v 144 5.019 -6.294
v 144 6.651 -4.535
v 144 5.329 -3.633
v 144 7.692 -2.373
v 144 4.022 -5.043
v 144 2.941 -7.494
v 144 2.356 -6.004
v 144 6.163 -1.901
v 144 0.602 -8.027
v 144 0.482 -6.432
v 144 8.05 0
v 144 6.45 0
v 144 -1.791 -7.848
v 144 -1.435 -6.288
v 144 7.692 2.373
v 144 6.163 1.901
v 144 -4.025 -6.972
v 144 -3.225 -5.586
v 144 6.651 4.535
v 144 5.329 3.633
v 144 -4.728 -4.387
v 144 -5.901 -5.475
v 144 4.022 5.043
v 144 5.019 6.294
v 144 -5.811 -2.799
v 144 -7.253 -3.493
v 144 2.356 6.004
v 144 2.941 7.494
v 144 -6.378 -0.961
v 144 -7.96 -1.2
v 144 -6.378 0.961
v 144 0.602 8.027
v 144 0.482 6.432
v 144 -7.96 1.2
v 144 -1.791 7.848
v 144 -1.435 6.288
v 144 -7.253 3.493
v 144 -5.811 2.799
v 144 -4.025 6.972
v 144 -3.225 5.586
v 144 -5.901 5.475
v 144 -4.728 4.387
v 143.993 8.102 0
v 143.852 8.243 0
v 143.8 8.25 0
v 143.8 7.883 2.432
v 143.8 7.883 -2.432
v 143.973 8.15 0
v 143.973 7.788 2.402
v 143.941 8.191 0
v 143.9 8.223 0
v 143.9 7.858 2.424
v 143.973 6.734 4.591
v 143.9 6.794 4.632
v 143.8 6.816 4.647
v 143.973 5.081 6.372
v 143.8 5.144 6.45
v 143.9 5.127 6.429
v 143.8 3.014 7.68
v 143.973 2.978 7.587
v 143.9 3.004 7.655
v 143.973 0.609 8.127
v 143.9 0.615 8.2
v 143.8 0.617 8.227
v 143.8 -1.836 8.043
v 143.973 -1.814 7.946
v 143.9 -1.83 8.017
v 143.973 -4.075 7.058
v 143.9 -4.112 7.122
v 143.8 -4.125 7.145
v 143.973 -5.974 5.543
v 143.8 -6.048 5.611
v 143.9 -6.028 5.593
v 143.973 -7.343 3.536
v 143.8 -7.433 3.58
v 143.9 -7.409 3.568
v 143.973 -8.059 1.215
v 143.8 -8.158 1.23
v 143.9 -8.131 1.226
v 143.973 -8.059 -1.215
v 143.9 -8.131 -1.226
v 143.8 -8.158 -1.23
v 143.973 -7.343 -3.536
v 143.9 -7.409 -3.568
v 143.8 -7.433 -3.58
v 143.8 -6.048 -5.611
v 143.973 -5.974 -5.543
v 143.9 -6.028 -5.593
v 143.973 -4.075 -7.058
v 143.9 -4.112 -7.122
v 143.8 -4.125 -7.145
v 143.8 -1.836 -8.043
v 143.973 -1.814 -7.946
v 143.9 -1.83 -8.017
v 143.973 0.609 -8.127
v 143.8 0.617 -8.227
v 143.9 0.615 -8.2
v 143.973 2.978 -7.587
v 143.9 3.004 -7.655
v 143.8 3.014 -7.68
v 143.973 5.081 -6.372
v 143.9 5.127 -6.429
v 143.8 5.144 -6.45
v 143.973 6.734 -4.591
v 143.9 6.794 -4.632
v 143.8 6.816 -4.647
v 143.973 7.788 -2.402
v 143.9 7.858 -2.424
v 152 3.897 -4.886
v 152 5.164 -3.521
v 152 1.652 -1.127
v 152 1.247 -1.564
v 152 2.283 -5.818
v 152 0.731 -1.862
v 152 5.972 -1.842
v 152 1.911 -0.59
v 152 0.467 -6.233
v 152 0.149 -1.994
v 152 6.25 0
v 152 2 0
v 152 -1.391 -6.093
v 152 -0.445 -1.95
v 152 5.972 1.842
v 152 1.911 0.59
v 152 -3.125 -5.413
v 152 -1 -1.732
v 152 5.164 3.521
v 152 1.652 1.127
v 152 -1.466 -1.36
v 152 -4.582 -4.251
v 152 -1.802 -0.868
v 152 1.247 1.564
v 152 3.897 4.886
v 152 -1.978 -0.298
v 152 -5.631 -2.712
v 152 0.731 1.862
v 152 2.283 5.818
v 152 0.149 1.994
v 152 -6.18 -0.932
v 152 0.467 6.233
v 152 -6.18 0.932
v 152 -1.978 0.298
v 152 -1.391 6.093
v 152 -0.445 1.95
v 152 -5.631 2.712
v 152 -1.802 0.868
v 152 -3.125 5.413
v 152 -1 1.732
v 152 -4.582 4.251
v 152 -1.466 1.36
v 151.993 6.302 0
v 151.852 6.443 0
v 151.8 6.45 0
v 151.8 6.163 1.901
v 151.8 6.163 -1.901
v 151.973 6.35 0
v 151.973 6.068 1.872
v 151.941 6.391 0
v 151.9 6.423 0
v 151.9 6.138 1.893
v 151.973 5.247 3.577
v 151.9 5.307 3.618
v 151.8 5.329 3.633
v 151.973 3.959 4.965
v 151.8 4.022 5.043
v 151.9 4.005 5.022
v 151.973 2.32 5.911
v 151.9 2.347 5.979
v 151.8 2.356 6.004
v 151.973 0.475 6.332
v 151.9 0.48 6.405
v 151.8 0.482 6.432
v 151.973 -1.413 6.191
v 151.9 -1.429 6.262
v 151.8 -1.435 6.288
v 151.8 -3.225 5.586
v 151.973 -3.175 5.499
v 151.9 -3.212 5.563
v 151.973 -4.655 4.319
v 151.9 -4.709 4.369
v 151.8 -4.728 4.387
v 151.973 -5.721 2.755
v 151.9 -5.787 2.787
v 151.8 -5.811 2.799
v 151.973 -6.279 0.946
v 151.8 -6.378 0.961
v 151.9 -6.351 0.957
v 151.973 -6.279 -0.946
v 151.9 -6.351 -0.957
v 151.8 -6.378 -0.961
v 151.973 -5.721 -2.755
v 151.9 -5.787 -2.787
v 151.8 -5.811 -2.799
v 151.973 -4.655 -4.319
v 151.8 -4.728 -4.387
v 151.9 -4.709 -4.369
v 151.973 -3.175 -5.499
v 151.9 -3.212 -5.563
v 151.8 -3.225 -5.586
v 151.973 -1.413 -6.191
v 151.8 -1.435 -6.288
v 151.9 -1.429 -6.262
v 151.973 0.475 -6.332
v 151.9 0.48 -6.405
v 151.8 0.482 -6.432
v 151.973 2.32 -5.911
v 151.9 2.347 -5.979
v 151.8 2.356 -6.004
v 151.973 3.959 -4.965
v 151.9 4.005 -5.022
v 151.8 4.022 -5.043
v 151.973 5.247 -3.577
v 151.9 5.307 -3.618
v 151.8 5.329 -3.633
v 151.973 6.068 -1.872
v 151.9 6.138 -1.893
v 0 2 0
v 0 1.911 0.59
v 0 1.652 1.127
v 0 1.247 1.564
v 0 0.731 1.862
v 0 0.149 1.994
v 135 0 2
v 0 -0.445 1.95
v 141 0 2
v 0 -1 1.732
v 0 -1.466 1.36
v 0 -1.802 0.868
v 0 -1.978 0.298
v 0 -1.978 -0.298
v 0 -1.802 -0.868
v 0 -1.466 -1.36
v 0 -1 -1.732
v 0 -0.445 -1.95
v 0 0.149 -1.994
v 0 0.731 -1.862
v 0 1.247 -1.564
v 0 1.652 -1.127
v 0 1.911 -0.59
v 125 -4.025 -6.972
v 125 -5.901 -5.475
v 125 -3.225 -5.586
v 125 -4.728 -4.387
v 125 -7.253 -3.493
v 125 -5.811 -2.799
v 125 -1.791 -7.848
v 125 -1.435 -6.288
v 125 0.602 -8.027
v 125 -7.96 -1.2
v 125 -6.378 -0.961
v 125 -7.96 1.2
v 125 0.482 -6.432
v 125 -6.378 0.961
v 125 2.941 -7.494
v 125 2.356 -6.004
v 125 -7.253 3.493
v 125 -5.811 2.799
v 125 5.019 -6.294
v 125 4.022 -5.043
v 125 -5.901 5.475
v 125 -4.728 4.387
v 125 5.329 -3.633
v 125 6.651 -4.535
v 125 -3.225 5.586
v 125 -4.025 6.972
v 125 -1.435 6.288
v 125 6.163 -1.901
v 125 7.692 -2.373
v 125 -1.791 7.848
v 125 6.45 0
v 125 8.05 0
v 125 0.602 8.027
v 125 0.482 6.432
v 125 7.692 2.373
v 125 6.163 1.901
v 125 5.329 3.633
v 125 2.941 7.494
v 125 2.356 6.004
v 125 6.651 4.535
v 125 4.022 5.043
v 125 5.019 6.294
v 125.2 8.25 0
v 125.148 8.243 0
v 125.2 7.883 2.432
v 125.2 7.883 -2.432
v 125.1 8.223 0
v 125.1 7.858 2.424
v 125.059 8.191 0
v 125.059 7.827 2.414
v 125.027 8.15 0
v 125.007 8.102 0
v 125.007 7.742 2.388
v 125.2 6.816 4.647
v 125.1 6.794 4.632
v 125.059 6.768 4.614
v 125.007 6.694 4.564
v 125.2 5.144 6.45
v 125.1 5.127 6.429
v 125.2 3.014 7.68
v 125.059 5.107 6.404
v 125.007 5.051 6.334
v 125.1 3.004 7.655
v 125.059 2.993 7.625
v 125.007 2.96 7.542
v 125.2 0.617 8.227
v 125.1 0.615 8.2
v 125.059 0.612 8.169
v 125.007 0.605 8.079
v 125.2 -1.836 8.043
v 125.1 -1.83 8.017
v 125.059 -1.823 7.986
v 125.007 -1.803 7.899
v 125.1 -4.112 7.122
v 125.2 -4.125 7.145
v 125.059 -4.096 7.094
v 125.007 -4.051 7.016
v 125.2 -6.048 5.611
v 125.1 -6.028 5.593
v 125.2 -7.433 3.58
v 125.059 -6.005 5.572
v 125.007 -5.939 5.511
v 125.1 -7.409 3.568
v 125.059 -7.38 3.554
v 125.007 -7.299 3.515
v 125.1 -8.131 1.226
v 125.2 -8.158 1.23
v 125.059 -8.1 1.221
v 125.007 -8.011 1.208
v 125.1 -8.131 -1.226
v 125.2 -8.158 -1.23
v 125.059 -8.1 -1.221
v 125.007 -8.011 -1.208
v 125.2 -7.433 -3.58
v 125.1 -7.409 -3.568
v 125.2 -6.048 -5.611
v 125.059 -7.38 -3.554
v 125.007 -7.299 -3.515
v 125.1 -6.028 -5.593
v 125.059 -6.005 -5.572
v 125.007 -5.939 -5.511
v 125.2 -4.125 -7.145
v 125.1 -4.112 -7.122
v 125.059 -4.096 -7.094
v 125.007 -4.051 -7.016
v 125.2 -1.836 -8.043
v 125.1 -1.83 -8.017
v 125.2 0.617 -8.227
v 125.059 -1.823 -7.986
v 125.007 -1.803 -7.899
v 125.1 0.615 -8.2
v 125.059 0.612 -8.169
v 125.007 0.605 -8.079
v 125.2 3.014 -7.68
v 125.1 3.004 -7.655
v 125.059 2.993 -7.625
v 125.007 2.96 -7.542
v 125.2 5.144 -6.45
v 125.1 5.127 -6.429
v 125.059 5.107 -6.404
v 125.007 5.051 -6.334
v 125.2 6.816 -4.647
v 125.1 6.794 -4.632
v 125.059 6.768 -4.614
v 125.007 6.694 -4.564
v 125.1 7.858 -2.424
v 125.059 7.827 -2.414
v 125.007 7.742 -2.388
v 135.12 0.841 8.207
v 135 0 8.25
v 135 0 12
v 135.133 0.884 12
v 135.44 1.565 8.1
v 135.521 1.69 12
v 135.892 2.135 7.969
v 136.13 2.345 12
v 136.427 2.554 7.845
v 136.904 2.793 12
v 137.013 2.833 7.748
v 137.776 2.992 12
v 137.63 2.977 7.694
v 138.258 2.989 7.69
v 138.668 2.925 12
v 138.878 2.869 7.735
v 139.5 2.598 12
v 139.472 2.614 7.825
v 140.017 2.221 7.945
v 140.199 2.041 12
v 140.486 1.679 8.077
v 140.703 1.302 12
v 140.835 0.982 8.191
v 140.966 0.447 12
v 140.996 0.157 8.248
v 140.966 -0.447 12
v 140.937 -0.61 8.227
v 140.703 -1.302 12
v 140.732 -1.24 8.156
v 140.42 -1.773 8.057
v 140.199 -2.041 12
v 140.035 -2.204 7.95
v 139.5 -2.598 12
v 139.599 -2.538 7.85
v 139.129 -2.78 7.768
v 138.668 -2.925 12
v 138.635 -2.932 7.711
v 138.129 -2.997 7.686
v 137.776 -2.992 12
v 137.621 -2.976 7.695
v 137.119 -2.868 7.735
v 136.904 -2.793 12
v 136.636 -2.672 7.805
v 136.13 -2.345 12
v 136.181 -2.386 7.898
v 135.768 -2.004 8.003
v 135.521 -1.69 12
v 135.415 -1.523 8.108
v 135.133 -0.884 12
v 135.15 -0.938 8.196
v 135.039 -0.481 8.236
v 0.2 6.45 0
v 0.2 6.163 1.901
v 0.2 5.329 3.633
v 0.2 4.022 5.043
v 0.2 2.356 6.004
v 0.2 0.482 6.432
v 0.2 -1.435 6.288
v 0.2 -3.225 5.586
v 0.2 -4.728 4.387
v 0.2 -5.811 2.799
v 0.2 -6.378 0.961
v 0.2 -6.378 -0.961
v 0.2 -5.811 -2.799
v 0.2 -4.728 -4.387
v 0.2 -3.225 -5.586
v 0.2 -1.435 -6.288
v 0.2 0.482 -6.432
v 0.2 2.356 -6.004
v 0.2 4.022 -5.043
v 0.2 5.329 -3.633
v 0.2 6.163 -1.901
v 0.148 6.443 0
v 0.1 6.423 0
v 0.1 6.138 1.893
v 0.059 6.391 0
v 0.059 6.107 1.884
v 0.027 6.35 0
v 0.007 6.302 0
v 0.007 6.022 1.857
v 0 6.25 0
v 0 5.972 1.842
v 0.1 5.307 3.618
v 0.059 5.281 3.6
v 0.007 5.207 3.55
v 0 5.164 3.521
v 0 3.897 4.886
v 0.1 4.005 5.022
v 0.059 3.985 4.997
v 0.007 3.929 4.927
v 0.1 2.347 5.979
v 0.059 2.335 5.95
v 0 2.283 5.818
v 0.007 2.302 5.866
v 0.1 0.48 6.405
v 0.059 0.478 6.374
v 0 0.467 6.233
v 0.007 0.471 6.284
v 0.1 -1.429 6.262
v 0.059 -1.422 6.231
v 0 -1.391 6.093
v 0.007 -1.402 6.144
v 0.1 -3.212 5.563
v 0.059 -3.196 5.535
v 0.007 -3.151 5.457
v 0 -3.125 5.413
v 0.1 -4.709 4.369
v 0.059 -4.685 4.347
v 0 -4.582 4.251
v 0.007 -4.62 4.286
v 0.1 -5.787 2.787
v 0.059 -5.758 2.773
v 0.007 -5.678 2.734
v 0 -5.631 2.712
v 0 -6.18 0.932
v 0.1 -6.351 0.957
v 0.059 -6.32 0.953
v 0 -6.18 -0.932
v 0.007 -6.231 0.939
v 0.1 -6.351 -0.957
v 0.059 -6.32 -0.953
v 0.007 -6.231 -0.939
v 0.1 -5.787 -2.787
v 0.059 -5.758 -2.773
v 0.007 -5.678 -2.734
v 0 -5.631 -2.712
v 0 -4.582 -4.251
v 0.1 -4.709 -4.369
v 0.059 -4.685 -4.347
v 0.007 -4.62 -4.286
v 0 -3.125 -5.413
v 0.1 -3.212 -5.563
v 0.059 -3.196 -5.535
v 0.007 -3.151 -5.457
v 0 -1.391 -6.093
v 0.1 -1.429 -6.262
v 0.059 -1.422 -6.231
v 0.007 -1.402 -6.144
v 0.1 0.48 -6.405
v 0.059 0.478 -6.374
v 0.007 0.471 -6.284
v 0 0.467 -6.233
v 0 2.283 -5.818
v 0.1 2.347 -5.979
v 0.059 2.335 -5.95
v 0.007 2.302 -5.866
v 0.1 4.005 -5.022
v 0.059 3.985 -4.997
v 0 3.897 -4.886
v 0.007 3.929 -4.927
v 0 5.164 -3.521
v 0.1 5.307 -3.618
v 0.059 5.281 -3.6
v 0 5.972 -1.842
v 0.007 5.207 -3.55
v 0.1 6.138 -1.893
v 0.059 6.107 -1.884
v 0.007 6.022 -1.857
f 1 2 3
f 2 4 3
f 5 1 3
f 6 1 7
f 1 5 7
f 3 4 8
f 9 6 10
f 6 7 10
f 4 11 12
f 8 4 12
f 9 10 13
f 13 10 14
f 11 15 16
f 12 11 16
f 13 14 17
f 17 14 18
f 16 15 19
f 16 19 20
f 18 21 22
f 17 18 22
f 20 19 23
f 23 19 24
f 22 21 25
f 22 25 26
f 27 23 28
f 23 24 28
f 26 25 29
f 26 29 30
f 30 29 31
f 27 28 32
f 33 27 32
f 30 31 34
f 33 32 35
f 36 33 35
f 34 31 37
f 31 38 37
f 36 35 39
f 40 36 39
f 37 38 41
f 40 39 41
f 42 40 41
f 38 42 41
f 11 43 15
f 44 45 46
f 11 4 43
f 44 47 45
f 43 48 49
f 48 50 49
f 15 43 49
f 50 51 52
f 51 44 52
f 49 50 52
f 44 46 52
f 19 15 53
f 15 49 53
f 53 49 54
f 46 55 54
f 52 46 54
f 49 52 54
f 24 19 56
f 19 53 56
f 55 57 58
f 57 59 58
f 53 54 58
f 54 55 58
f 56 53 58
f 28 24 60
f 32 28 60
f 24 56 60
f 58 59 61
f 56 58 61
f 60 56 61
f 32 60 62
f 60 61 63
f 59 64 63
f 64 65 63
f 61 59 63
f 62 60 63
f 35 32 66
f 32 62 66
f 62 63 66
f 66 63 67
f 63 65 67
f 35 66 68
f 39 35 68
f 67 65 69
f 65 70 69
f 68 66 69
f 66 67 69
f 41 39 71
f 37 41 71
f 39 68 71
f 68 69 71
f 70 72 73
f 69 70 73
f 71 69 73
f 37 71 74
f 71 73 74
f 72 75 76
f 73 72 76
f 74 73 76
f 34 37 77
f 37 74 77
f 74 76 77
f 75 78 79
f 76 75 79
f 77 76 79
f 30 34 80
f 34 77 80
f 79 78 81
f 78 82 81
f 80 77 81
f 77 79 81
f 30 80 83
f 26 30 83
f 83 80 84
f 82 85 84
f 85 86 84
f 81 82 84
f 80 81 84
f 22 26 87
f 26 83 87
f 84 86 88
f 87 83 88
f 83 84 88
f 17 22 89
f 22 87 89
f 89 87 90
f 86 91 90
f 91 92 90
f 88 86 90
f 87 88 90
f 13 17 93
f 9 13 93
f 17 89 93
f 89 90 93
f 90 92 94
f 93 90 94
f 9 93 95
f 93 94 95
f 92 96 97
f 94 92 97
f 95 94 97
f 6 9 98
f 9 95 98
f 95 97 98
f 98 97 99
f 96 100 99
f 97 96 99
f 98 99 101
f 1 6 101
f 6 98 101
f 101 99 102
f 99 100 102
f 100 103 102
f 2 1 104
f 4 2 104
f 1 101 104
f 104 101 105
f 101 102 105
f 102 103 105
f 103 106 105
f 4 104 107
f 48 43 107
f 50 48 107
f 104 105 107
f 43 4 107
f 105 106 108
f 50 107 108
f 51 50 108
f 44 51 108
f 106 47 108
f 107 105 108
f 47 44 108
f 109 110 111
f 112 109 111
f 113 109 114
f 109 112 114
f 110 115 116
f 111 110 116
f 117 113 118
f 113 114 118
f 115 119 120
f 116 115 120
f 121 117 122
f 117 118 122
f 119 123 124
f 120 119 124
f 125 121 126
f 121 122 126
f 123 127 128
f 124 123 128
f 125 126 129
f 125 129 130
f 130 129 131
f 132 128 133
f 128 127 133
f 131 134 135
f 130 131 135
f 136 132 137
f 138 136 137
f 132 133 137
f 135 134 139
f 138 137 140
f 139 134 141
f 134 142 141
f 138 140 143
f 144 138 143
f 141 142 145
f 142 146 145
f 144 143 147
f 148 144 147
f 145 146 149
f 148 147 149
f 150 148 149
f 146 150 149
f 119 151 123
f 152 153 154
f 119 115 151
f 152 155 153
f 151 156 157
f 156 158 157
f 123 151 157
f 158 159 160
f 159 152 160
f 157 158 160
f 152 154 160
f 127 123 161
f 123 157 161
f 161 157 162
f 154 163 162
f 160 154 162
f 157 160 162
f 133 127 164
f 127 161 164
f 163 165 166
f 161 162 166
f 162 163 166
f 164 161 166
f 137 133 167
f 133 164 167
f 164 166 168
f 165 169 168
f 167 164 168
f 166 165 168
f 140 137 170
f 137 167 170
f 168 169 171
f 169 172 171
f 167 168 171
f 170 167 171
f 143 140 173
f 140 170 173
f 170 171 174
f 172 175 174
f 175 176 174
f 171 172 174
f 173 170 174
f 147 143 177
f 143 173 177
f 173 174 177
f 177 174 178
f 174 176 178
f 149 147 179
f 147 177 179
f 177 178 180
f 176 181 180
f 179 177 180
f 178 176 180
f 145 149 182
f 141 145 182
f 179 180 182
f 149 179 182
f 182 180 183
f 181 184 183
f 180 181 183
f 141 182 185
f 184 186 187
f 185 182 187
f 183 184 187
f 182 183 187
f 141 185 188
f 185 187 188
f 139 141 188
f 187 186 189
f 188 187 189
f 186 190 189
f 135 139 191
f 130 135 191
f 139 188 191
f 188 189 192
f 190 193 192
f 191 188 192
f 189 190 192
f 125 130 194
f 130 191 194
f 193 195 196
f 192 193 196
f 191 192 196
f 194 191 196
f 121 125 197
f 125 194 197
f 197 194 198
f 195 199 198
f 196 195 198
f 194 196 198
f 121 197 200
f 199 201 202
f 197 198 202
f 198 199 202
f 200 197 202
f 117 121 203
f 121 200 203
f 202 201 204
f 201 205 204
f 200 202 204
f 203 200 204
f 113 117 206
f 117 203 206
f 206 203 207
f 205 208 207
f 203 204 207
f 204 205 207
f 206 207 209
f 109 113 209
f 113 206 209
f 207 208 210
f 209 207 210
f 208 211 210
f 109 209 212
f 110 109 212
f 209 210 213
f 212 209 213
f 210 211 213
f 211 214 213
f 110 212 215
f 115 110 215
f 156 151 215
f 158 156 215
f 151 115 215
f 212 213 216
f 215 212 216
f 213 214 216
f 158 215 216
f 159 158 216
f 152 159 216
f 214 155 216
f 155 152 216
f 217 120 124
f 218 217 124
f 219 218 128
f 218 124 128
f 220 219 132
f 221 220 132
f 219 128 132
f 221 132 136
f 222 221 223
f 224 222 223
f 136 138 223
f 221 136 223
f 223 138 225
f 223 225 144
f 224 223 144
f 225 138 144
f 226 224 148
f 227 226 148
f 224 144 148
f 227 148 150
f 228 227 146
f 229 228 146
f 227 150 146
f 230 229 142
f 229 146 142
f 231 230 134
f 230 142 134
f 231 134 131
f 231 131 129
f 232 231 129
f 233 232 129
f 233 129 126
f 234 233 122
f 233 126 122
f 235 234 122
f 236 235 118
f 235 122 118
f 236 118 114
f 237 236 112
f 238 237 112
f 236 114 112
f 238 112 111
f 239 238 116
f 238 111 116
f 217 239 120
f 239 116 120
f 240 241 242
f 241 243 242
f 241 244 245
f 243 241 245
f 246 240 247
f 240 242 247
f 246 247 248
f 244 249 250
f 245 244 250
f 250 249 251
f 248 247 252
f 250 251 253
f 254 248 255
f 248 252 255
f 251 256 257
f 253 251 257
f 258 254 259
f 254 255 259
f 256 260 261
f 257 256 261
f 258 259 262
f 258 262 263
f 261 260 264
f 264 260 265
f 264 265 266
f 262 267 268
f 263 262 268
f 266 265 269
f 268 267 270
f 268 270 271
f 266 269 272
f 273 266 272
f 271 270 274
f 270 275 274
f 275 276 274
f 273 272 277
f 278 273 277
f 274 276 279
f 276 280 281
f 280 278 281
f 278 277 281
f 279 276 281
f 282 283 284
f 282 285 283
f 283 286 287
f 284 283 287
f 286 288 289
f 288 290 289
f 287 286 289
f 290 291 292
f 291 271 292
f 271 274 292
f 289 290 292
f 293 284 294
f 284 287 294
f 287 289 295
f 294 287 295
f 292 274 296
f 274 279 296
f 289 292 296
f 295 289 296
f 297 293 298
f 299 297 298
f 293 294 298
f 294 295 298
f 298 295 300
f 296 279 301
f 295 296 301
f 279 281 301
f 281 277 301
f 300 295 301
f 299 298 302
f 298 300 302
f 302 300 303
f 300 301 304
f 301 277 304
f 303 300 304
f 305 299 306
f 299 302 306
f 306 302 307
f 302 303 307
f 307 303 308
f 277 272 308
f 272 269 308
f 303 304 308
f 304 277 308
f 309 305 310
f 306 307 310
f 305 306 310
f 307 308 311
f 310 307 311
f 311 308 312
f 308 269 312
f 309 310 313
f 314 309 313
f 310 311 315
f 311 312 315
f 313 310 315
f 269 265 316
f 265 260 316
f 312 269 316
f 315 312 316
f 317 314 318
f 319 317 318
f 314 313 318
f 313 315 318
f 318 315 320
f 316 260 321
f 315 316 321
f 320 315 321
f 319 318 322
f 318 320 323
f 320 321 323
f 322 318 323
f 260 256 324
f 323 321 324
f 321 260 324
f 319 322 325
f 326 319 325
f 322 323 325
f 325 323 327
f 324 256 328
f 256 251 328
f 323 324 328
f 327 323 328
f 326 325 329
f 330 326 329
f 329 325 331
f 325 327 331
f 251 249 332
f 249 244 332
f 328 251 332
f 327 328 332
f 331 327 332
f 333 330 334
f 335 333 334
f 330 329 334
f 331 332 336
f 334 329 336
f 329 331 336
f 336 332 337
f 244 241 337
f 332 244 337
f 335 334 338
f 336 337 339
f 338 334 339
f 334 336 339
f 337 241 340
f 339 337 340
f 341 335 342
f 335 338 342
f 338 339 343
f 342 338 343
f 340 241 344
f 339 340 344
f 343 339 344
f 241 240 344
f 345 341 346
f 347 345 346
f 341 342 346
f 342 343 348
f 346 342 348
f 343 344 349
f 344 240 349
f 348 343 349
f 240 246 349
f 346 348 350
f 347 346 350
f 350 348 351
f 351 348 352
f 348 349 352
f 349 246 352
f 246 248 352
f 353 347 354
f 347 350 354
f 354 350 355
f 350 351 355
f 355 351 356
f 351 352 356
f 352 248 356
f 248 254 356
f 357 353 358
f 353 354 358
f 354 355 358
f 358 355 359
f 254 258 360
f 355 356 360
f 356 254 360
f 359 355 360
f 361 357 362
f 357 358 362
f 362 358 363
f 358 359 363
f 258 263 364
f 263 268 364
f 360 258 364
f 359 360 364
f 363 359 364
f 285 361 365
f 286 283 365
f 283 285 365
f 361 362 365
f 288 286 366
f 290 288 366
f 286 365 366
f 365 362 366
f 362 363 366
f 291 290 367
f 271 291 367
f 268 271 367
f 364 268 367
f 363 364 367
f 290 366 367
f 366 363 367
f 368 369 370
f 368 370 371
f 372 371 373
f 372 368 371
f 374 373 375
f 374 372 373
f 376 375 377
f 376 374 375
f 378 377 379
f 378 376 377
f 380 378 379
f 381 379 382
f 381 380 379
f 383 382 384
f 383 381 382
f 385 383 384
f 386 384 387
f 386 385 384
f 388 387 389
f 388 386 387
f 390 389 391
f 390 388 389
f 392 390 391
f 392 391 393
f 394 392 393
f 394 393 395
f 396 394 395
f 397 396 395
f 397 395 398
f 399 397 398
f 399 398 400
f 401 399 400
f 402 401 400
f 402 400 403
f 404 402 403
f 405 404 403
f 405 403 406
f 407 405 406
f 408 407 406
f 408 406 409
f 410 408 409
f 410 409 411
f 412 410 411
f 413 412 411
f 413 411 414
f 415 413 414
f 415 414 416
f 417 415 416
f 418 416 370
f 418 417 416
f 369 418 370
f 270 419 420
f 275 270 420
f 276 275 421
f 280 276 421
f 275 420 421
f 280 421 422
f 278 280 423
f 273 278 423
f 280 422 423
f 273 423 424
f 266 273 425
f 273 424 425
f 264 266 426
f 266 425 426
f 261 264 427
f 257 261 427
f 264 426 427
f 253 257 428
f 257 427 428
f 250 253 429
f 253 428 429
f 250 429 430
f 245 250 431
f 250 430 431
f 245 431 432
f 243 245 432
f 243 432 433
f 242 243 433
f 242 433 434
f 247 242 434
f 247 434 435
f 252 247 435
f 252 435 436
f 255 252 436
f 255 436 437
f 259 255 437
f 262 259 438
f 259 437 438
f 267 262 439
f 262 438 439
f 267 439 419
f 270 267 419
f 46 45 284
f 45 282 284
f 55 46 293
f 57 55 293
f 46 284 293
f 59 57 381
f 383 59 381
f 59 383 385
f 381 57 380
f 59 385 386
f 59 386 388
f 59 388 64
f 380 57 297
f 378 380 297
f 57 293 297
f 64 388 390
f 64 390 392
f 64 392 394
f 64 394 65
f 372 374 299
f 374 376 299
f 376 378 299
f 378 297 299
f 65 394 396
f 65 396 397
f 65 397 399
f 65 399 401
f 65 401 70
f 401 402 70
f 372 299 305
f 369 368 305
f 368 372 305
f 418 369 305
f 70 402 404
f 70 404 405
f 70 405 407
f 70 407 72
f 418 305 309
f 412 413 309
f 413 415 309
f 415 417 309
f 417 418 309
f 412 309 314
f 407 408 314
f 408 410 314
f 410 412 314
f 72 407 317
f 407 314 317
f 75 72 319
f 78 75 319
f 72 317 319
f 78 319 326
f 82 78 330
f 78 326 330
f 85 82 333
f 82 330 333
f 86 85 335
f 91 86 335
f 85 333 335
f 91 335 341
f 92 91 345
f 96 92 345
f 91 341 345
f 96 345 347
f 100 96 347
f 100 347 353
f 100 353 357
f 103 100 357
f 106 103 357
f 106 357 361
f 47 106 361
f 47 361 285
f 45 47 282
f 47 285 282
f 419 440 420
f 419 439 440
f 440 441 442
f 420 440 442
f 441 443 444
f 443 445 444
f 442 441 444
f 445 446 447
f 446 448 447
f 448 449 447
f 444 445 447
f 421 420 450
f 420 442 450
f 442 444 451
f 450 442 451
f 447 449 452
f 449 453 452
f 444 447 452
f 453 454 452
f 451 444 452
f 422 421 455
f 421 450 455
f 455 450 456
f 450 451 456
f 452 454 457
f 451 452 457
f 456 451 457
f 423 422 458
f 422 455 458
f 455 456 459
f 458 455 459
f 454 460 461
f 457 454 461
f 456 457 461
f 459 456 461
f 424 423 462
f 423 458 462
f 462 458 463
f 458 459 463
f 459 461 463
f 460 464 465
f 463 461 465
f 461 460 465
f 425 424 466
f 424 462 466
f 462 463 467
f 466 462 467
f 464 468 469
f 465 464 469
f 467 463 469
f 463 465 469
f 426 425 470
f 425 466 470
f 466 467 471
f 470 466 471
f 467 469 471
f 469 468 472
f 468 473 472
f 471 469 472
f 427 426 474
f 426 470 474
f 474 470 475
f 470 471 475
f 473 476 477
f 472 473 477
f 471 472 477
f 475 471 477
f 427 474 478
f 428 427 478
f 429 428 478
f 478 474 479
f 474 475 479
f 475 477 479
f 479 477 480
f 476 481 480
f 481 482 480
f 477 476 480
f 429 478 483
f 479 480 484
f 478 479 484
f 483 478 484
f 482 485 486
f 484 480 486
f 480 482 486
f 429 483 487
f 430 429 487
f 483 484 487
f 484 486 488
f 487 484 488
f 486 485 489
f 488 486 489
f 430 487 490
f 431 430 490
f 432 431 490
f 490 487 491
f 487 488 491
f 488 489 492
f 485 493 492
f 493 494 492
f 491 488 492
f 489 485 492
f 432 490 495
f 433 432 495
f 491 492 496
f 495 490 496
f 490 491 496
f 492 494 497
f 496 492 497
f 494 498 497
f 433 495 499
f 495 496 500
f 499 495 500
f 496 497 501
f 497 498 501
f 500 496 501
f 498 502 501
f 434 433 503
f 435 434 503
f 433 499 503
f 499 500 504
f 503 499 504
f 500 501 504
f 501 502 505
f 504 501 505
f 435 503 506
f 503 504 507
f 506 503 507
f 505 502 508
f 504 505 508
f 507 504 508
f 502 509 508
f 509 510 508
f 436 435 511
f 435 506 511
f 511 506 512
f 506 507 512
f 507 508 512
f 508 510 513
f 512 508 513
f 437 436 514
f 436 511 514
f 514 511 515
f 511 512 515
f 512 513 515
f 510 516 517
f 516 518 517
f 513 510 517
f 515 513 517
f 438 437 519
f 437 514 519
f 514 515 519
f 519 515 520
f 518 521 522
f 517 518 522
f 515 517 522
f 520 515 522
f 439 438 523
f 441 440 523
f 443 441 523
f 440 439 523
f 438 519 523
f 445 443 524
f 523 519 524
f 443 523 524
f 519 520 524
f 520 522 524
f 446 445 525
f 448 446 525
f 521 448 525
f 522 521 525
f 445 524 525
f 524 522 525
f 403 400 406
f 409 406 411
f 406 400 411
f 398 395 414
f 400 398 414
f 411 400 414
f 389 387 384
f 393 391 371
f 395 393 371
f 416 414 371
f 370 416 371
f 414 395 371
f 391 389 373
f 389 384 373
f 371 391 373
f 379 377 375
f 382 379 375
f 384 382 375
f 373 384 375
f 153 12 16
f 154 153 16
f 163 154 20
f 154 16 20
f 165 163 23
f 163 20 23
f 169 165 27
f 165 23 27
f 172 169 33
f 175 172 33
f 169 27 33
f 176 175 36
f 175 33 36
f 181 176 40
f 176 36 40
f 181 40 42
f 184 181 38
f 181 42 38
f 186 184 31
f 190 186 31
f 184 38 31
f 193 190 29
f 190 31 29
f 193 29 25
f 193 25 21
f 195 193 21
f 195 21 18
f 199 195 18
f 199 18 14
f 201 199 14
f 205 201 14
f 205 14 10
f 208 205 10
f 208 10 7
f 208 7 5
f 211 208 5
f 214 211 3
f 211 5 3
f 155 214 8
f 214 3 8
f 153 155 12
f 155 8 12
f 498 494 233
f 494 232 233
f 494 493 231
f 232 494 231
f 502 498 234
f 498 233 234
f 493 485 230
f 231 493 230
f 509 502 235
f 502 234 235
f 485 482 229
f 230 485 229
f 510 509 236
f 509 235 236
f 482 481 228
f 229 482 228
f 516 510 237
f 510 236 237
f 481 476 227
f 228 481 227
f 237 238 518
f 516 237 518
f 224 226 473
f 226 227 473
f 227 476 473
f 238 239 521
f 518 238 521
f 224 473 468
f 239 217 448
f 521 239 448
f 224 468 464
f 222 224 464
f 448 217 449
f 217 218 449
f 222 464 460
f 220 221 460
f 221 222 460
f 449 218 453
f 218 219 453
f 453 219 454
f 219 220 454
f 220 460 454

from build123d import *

# Parameters (mm, degrees)
ZAOKR_GLENIE1_R             = 0.2
SZKIC3_R                    = 3
DODANIE_WYCI_GNI_CIE1_DEPTH = 10


with BuildPart() as part:
    # Szkic1 → Obrót1 (revolve)
    with BuildSketch(Plane.XY):
        Polygon((0, 2), (152, 2), (152, 6.45), (144, 6.45), (144, 8.25), (125, 8.25), (125, 6.45), (0, 6.45), align=None)
    revolve(axis=Axis((0, 0, 0), (1, 0, 0)))

    # Zaokrąglenie1
    zaokr_glenie1_edges = [part.edges().sort_by_distance(p)[0] for p in [
        (152, -6.45, 0),
        (144, -8.25, 0),
        (125, -8.25, 0),
        (0, -6.45, 0),
    ]]
    fillet(zaokr_glenie1_edges, radius=ZAOKR_GLENIE1_R)

    # Szkic3 → Dodanie-wyciągnięcie1 (add)
    with BuildSketch(Plane(origin=(0, 0, 2), x_dir=(-1, 0, 0), z_dir=(0, 0, -1))):
        with Locations((-138, 0)):
            Circle(SZKIC3_R)
    extrude(amount=-DODANIE_WYCI_GNI_CIE1_DEPTH)


solid = part.part
